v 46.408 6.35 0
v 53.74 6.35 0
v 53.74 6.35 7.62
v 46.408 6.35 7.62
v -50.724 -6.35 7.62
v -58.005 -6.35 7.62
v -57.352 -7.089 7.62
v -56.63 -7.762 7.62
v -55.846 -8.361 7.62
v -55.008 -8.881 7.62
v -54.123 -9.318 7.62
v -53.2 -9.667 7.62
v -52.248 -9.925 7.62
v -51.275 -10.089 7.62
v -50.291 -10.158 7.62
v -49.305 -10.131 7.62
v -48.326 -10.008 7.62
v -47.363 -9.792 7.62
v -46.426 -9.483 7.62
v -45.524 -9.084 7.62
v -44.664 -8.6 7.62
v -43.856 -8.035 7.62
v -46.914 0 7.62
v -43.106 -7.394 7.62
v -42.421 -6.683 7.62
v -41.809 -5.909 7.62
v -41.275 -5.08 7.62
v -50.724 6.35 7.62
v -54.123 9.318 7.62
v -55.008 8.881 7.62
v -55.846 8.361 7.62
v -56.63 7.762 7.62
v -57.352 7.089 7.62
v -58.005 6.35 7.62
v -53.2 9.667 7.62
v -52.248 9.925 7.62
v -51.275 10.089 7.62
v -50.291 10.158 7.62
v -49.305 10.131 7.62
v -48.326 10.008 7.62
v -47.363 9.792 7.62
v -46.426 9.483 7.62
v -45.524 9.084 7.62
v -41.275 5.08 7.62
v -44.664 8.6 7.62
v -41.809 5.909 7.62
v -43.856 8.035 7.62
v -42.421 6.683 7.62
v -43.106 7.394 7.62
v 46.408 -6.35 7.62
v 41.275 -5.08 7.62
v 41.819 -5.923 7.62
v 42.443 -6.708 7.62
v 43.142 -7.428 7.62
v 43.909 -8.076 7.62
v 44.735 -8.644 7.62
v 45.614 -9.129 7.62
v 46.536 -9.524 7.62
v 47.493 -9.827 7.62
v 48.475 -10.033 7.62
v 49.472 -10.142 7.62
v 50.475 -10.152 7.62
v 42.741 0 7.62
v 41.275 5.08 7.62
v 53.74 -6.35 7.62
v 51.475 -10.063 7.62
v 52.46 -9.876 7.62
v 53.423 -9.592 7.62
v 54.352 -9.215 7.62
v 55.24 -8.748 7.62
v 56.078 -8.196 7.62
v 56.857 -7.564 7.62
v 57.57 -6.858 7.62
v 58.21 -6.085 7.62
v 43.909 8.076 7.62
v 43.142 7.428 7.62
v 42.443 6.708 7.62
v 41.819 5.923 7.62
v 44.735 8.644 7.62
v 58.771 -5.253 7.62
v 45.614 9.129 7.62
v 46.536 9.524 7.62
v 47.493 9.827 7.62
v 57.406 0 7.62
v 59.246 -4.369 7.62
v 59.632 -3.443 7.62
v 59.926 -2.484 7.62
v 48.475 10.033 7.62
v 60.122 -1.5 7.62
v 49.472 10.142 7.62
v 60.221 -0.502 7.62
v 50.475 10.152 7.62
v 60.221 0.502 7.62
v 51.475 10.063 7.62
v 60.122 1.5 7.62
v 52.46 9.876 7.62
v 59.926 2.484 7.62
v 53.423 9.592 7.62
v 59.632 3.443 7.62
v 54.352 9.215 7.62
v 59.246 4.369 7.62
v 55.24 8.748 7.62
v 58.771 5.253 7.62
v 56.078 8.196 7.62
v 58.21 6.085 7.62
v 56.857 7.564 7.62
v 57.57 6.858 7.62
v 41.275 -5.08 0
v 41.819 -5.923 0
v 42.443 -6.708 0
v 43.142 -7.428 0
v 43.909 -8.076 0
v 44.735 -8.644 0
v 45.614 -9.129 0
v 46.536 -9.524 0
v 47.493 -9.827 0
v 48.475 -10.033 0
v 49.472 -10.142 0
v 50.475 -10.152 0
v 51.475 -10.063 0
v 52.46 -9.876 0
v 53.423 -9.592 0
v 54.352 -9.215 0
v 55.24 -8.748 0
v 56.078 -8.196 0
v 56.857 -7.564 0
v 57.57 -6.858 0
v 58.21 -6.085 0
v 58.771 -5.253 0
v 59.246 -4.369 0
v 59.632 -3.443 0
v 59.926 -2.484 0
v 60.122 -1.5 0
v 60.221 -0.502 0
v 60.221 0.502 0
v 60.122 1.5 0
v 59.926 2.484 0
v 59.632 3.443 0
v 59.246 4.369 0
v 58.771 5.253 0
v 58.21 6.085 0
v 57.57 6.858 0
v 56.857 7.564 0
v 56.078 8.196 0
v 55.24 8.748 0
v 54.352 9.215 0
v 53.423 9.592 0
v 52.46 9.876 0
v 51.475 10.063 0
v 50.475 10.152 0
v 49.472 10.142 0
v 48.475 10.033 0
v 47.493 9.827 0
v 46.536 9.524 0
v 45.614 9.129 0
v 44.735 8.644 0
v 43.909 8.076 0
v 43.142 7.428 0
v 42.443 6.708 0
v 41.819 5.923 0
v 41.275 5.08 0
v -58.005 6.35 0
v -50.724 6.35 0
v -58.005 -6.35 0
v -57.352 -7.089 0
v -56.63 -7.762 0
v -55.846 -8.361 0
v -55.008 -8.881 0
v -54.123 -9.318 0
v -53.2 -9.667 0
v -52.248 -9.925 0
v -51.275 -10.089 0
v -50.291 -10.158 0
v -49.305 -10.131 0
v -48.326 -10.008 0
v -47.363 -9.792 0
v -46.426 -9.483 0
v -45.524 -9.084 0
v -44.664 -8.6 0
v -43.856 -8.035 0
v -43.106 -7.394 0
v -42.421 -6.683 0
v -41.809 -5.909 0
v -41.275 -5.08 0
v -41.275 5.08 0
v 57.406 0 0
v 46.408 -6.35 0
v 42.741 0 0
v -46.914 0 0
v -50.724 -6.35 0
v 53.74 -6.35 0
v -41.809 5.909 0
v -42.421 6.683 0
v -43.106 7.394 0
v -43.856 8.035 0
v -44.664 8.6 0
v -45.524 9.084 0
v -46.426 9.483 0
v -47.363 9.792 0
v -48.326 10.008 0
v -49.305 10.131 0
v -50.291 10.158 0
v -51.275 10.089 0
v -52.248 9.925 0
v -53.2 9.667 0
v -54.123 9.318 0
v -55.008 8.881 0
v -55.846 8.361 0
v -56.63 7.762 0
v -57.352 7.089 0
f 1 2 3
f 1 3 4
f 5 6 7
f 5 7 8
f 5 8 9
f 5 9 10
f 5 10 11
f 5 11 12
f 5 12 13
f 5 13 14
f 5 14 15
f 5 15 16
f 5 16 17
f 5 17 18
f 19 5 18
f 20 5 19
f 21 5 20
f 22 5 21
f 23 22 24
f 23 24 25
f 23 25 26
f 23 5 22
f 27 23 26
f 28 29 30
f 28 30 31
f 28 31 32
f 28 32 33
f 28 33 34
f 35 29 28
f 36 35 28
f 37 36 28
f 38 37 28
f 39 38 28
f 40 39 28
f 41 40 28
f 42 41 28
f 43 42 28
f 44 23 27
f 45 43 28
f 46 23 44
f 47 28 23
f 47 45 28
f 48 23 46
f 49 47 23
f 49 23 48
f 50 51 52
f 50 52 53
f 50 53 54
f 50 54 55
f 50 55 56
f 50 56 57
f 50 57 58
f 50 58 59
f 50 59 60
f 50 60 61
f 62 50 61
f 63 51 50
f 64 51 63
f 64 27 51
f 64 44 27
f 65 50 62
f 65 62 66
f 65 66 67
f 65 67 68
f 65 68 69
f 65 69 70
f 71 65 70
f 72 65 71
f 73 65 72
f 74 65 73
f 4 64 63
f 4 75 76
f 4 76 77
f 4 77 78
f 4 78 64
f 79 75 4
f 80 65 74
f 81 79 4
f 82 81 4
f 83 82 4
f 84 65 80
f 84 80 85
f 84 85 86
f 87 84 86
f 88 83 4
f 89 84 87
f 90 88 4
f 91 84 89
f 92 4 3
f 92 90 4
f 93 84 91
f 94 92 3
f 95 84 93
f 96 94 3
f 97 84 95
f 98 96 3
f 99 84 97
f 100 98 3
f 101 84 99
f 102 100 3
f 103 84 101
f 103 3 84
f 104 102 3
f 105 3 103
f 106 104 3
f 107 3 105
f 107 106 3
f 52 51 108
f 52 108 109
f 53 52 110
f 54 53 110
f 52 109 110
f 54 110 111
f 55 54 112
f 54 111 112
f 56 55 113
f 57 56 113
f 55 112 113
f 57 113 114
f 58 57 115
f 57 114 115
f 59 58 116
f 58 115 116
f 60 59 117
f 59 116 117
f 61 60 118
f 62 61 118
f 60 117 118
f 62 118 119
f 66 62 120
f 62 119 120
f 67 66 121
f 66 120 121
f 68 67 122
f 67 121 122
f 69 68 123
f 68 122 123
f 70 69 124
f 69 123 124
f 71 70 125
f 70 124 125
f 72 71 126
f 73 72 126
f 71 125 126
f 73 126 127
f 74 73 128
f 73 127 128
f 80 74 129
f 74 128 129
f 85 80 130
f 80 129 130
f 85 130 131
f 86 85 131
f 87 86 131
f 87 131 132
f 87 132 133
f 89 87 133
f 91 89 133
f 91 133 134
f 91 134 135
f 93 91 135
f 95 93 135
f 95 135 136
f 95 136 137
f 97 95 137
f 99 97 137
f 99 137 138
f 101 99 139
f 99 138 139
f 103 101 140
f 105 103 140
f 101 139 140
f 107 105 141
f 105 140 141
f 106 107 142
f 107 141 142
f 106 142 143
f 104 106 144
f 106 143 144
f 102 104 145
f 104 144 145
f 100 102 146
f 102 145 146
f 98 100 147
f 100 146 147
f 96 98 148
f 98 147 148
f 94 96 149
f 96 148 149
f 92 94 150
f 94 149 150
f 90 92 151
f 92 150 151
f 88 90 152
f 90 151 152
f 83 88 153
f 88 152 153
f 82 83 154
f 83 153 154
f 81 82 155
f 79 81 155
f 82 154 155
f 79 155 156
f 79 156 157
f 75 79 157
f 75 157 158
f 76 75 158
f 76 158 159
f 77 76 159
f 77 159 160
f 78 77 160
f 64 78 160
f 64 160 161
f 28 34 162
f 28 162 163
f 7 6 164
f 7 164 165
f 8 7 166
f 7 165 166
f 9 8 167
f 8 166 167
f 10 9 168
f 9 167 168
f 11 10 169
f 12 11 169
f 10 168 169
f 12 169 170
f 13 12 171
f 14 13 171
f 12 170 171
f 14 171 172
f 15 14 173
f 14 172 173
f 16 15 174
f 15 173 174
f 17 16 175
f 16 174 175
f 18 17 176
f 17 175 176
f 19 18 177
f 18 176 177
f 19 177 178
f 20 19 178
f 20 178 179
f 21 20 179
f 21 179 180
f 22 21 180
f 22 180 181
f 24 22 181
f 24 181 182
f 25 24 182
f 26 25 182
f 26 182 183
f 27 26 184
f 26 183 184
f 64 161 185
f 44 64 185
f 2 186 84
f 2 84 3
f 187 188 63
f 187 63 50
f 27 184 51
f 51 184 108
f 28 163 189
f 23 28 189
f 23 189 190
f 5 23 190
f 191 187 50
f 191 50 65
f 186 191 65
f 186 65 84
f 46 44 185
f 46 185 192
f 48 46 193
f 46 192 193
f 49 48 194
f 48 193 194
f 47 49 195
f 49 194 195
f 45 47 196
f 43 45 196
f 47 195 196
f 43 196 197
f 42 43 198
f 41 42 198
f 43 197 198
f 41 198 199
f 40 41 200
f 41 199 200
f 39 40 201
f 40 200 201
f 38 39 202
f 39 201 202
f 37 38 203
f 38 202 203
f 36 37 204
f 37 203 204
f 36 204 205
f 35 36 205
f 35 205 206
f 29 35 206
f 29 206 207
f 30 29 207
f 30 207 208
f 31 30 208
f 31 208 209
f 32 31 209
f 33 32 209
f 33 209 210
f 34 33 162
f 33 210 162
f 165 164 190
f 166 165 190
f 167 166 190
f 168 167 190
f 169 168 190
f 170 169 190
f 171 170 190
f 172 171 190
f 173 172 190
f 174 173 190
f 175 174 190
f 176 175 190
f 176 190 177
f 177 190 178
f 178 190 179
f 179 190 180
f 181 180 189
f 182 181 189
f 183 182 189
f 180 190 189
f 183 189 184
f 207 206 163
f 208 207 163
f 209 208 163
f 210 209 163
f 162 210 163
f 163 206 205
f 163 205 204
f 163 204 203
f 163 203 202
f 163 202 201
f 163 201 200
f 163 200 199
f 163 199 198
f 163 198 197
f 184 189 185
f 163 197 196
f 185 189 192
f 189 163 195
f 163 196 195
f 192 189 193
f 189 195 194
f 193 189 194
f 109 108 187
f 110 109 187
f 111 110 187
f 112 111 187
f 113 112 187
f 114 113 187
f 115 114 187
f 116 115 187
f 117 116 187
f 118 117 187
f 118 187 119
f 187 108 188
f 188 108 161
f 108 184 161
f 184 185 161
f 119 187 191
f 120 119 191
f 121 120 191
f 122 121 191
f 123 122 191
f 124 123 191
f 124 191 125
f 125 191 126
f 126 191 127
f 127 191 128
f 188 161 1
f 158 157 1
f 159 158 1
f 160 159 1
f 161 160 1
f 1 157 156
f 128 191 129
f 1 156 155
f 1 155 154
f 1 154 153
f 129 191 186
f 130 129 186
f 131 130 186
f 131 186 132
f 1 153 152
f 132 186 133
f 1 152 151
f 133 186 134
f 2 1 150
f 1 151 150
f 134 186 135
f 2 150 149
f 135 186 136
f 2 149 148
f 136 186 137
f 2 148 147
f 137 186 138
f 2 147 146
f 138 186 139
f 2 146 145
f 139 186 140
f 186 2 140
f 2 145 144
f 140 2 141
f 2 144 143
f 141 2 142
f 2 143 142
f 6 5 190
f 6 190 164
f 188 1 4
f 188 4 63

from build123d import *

# Parameters (mm, degrees)
BOSS_EXTRUDE1_DEPTH = 7.62


with BuildPart() as part:
    # Sketch1 → Boss-Extrude1 (new body)
    with BuildSketch(Plane.XY):
        with BuildLine():
            Line((-58.00496556, 6.35), (-50.723882736, 6.35))
            Line((-50.723882736, 6.35), (-46.913882736, 0))
            Line((-46.913882736, 0), (-50.723882736, -6.35))
            Line((-50.723882736, -6.35), (-58.00496556, -6.35))
            ThreePointArc((-58.00496556, -6.35), (-49.304767983, -10.130851984), (-41.275, -5.08))
            Line((-41.275, -5.08), (41.275, -5.08))
            ThreePointArc((41.275, -5.08), (60.233818102, 0), (41.275, 5.08))
            Line((41.275, 5.08), (-41.275, 5.08))
            ThreePointArc((-41.275, 5.08), (-49.304767983, 10.130851984), (-58.00496556, 6.35))
        make_face()
        Polygon((57.406166521, 0), (53.739992312, 6.35), (46.407643893, 6.35), (42.741469684, 0), (46.407643893, -6.35), (53.739992312, -6.35), align=None, mode=Mode.SUBTRACT)
    extrude(amount=BOSS_EXTRUDE1_DEPTH)


solid = part.part
